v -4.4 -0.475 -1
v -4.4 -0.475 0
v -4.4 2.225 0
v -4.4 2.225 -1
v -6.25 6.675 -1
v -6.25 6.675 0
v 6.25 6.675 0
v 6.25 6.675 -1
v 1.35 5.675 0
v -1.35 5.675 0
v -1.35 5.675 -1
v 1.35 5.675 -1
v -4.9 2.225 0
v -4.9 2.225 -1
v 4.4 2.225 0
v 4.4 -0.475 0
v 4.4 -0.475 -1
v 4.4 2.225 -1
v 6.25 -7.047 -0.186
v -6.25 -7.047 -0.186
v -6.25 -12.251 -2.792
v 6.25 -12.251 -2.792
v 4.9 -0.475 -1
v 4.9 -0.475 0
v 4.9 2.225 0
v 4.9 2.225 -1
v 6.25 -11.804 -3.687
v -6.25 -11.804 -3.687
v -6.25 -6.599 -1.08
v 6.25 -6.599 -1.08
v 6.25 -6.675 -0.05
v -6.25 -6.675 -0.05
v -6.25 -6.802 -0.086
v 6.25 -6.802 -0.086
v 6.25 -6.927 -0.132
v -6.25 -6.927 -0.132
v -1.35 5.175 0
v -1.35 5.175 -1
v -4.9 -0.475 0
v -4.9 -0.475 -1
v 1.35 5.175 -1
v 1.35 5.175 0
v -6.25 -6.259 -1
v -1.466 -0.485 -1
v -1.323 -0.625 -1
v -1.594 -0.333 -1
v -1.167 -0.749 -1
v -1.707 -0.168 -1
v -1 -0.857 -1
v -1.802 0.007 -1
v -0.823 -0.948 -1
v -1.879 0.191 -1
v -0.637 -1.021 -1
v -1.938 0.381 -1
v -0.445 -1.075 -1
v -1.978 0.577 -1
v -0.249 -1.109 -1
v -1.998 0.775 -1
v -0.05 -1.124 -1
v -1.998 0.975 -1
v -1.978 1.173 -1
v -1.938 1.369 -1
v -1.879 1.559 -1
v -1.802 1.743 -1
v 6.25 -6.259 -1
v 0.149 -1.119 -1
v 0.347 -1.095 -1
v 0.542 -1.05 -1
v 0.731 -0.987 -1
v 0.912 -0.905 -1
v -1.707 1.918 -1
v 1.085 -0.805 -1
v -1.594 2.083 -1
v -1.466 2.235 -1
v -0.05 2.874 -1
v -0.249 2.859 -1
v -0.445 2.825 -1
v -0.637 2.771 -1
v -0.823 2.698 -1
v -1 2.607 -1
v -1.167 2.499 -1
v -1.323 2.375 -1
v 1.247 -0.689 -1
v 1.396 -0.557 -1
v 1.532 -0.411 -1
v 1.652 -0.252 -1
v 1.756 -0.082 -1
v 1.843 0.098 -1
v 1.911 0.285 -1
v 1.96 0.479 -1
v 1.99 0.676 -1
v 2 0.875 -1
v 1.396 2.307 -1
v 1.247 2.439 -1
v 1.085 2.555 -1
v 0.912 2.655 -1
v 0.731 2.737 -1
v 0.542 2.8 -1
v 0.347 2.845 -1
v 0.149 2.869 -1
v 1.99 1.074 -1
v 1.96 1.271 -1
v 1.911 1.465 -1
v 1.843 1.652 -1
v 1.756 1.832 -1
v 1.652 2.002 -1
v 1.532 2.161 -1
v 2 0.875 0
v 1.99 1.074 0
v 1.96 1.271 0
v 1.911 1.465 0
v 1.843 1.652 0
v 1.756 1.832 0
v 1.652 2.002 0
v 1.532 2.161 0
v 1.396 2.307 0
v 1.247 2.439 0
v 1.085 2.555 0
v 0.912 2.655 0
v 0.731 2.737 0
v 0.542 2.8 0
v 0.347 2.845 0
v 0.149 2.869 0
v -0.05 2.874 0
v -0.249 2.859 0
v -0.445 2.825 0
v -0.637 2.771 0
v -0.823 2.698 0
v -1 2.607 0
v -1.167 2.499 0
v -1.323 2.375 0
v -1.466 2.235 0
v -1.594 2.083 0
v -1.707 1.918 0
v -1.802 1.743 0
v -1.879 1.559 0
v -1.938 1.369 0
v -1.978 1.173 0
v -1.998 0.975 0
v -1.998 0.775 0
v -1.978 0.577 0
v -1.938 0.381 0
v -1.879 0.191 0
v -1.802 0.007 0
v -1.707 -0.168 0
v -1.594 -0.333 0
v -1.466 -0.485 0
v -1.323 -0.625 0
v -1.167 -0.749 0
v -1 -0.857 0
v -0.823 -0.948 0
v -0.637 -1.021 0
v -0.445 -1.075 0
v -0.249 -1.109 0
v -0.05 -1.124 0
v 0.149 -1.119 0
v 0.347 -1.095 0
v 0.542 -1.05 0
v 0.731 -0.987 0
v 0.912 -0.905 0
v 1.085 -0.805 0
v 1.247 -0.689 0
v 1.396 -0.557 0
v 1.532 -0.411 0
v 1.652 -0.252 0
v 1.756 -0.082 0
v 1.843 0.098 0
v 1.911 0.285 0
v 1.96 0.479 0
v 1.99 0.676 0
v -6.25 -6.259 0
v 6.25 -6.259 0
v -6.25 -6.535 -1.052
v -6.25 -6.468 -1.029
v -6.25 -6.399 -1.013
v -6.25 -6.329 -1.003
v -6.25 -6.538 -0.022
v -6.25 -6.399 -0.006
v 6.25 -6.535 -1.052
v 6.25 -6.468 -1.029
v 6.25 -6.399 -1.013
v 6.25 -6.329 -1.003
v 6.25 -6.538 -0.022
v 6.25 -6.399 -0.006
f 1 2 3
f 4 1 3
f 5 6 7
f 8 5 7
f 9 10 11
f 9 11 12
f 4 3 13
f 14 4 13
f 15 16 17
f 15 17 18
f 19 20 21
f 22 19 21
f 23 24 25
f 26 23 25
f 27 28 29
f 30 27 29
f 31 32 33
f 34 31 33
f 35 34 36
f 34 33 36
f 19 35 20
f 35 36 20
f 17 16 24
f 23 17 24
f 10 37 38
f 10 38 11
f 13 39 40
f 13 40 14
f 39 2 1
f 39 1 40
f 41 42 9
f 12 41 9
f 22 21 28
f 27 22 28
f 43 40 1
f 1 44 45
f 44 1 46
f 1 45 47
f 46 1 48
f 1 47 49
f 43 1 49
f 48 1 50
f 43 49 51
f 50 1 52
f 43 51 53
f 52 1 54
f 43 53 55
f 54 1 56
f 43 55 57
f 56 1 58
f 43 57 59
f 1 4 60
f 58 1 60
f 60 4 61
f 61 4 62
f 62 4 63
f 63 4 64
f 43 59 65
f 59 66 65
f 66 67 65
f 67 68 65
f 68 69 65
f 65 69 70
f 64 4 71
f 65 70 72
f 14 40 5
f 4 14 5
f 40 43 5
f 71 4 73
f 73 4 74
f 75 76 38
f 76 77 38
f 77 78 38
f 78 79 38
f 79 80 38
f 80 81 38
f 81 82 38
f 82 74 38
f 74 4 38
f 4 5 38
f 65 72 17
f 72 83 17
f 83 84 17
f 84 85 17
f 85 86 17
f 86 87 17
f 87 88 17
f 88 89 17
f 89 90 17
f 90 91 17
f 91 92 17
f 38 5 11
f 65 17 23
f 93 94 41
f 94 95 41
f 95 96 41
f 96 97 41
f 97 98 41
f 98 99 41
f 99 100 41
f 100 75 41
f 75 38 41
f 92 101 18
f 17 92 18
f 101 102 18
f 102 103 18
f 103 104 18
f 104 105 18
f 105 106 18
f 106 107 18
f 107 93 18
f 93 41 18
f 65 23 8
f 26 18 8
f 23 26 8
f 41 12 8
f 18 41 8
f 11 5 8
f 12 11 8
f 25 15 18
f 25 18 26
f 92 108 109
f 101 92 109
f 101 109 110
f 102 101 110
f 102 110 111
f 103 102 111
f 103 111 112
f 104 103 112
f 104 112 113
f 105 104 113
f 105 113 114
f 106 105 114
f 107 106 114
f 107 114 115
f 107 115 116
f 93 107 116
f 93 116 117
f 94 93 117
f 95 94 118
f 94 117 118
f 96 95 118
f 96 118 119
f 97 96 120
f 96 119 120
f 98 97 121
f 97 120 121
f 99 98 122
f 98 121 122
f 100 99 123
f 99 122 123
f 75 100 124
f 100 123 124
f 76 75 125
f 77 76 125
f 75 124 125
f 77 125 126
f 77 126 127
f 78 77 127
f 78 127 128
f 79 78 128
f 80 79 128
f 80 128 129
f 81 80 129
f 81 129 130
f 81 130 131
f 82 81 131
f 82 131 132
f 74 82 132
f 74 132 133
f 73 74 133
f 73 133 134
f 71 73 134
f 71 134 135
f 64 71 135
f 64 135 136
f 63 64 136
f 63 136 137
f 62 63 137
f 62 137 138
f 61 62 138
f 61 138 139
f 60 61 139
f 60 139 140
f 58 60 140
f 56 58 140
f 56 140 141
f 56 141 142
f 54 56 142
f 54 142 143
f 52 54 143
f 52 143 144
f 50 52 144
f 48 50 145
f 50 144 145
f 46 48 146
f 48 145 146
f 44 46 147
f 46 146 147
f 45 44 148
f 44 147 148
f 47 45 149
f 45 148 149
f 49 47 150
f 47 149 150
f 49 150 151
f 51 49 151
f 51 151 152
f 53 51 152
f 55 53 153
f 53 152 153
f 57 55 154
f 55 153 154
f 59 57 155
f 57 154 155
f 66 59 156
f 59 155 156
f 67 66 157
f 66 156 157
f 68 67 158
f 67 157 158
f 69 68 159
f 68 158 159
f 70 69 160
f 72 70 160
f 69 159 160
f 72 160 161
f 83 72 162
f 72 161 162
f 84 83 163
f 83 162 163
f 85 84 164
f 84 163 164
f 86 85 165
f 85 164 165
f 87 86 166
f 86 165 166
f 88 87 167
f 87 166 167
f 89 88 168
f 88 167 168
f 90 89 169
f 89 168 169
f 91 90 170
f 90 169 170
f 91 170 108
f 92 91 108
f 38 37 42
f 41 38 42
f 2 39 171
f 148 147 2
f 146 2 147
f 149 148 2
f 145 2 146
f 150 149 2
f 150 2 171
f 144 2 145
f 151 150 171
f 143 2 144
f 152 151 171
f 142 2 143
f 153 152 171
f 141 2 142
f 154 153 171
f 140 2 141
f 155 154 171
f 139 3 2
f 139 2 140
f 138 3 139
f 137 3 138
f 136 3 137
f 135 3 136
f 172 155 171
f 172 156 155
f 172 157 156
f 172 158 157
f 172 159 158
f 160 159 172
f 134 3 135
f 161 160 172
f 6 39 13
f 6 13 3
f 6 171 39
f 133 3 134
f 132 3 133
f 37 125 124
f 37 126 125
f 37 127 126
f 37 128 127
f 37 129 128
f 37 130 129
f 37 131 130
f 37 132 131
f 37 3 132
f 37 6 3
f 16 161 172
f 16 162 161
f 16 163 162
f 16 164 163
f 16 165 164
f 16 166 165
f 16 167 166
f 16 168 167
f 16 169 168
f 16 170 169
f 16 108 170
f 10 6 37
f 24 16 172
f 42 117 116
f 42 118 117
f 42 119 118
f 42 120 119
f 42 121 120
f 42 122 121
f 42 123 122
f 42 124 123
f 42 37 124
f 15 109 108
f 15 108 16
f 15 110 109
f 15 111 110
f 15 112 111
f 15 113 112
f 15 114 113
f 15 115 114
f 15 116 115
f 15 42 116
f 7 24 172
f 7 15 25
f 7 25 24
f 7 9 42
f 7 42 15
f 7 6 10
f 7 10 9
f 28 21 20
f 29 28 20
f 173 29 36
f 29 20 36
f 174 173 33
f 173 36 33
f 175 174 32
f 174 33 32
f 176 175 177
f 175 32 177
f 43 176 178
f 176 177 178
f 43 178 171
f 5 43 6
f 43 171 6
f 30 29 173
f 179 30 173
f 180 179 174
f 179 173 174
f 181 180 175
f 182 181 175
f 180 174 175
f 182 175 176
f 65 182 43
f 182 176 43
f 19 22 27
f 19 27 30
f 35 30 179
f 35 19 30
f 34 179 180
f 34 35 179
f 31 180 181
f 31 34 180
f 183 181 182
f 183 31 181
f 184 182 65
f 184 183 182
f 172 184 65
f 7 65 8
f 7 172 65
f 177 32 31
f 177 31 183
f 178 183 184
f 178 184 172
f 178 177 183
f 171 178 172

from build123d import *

# Parameters (mm, degrees)
BASES_W              = 12.5
BASES_H              = 13.35
BASE_DEPTH           = 1
SCREWACCESSS_R       = 2
SCREW_ACCESS_DEPTH   = 10.198811064
NEUTRALS_W           = 0.5
NEUTRALS_H           = 2.7
NEUTRAL_DEPTH        = 1.6
GROUNDS_W            = 2.7
GROUNDS_H            = 0.5
GROUND_DEPTH         = 1.6
EDGE_FLANGE1_START   = -6.25
EDGE_FLANGE1_DEPTH   = 12.5
EDGE_FLANGE1_2_DEPTH = 12.5


# Read off the part's stored shape, not the designer's step: Edge-Flange1
with BuildPart() as part:
    # BaseS → BASE (new body)
    with BuildSketch(Plane.XY):
        Rectangle(BASES_W, BASES_H)
    extrude(amount=-BASE_DEPTH)

    # ScrewAccessS → SCREW ACCESS (cut, through all)
    with BuildSketch(Plane.XY):
        with Locations((0, 0.875)):
            Circle(SCREWACCESSS_R)
    extrude(amount=-SCREW_ACCESS_DEPTH, mode=Mode.SUBTRACT)

    # NeutralS → NEUTRAL (cut)
    with BuildSketch(Plane.XY):
        with Locations((4.65, 0.875)):
            Rectangle(NEUTRALS_W, NEUTRALS_H)
    neutral = extrude(amount=-NEUTRAL_DEPTH, mode=Mode.SUBTRACT)

    # LINE HM: NEUTRAL across plane
    add(neutral.mirror(Plane(origin=(0, 0, 0), x_dir=(0, 0, 1), z_dir=(1, 0, 0))), mode=Mode.SUBTRACT)

    # GroundS → GROUND (cut)
    with BuildSketch(Plane.XY):
        with Locations((0, 5.425)):
            Rectangle(GROUNDS_W, GROUNDS_H)
    extrude(amount=-GROUND_DEPTH, mode=Mode.SUBTRACT)

    # Edge-Flange1 outline → Edge-Flange1 (cut)
    with BuildSketch(Plane.YZ.offset(EDGE_FLANGE1_START)):
        with BuildLine():
            Line((-6.675, 0), (-6.675, -0.049881461))
            ThreePointArc((-6.675, -0.049881461), (-6.468466602, -0.01251486), (-6.25895363, 0))
            Line((-6.25895363, 0), (-6.675, 0))
        make_face()
    extrude(amount=EDGE_FLANGE1_DEPTH, mode=Mode.SUBTRACT)

    # Edge-Flange1 2 outline → Edge-Flange1 2 (add)
    with BuildSketch(Plane.YZ.offset(EDGE_FLANGE1_START)):
        with BuildLine():
            ThreePointArc((-6.675, -0.049881461), (-6.864855726, -0.107582786), (-7.047009625, -0.186288543))
            Line((-7.047009625, -0.186288543), (-12.251294526, -2.79240029))
            Line((-12.251294526, -2.79240029), (-11.803535438, -3.686554527))
            Line((-11.803535438, -3.686554527), (-6.599250537, -1.08044278))
            ThreePointArc((-6.599250537, -1.08044278), (-6.43379143, -1.020384057), (-6.25895363, -1))
            Line((-6.25895363, -1), (-6.675, -1))
            Line((-6.675, -1), (-6.675, -0.049881461))
        make_face()
    extrude(amount=EDGE_FLANGE1_2_DEPTH)


solid = part.part
